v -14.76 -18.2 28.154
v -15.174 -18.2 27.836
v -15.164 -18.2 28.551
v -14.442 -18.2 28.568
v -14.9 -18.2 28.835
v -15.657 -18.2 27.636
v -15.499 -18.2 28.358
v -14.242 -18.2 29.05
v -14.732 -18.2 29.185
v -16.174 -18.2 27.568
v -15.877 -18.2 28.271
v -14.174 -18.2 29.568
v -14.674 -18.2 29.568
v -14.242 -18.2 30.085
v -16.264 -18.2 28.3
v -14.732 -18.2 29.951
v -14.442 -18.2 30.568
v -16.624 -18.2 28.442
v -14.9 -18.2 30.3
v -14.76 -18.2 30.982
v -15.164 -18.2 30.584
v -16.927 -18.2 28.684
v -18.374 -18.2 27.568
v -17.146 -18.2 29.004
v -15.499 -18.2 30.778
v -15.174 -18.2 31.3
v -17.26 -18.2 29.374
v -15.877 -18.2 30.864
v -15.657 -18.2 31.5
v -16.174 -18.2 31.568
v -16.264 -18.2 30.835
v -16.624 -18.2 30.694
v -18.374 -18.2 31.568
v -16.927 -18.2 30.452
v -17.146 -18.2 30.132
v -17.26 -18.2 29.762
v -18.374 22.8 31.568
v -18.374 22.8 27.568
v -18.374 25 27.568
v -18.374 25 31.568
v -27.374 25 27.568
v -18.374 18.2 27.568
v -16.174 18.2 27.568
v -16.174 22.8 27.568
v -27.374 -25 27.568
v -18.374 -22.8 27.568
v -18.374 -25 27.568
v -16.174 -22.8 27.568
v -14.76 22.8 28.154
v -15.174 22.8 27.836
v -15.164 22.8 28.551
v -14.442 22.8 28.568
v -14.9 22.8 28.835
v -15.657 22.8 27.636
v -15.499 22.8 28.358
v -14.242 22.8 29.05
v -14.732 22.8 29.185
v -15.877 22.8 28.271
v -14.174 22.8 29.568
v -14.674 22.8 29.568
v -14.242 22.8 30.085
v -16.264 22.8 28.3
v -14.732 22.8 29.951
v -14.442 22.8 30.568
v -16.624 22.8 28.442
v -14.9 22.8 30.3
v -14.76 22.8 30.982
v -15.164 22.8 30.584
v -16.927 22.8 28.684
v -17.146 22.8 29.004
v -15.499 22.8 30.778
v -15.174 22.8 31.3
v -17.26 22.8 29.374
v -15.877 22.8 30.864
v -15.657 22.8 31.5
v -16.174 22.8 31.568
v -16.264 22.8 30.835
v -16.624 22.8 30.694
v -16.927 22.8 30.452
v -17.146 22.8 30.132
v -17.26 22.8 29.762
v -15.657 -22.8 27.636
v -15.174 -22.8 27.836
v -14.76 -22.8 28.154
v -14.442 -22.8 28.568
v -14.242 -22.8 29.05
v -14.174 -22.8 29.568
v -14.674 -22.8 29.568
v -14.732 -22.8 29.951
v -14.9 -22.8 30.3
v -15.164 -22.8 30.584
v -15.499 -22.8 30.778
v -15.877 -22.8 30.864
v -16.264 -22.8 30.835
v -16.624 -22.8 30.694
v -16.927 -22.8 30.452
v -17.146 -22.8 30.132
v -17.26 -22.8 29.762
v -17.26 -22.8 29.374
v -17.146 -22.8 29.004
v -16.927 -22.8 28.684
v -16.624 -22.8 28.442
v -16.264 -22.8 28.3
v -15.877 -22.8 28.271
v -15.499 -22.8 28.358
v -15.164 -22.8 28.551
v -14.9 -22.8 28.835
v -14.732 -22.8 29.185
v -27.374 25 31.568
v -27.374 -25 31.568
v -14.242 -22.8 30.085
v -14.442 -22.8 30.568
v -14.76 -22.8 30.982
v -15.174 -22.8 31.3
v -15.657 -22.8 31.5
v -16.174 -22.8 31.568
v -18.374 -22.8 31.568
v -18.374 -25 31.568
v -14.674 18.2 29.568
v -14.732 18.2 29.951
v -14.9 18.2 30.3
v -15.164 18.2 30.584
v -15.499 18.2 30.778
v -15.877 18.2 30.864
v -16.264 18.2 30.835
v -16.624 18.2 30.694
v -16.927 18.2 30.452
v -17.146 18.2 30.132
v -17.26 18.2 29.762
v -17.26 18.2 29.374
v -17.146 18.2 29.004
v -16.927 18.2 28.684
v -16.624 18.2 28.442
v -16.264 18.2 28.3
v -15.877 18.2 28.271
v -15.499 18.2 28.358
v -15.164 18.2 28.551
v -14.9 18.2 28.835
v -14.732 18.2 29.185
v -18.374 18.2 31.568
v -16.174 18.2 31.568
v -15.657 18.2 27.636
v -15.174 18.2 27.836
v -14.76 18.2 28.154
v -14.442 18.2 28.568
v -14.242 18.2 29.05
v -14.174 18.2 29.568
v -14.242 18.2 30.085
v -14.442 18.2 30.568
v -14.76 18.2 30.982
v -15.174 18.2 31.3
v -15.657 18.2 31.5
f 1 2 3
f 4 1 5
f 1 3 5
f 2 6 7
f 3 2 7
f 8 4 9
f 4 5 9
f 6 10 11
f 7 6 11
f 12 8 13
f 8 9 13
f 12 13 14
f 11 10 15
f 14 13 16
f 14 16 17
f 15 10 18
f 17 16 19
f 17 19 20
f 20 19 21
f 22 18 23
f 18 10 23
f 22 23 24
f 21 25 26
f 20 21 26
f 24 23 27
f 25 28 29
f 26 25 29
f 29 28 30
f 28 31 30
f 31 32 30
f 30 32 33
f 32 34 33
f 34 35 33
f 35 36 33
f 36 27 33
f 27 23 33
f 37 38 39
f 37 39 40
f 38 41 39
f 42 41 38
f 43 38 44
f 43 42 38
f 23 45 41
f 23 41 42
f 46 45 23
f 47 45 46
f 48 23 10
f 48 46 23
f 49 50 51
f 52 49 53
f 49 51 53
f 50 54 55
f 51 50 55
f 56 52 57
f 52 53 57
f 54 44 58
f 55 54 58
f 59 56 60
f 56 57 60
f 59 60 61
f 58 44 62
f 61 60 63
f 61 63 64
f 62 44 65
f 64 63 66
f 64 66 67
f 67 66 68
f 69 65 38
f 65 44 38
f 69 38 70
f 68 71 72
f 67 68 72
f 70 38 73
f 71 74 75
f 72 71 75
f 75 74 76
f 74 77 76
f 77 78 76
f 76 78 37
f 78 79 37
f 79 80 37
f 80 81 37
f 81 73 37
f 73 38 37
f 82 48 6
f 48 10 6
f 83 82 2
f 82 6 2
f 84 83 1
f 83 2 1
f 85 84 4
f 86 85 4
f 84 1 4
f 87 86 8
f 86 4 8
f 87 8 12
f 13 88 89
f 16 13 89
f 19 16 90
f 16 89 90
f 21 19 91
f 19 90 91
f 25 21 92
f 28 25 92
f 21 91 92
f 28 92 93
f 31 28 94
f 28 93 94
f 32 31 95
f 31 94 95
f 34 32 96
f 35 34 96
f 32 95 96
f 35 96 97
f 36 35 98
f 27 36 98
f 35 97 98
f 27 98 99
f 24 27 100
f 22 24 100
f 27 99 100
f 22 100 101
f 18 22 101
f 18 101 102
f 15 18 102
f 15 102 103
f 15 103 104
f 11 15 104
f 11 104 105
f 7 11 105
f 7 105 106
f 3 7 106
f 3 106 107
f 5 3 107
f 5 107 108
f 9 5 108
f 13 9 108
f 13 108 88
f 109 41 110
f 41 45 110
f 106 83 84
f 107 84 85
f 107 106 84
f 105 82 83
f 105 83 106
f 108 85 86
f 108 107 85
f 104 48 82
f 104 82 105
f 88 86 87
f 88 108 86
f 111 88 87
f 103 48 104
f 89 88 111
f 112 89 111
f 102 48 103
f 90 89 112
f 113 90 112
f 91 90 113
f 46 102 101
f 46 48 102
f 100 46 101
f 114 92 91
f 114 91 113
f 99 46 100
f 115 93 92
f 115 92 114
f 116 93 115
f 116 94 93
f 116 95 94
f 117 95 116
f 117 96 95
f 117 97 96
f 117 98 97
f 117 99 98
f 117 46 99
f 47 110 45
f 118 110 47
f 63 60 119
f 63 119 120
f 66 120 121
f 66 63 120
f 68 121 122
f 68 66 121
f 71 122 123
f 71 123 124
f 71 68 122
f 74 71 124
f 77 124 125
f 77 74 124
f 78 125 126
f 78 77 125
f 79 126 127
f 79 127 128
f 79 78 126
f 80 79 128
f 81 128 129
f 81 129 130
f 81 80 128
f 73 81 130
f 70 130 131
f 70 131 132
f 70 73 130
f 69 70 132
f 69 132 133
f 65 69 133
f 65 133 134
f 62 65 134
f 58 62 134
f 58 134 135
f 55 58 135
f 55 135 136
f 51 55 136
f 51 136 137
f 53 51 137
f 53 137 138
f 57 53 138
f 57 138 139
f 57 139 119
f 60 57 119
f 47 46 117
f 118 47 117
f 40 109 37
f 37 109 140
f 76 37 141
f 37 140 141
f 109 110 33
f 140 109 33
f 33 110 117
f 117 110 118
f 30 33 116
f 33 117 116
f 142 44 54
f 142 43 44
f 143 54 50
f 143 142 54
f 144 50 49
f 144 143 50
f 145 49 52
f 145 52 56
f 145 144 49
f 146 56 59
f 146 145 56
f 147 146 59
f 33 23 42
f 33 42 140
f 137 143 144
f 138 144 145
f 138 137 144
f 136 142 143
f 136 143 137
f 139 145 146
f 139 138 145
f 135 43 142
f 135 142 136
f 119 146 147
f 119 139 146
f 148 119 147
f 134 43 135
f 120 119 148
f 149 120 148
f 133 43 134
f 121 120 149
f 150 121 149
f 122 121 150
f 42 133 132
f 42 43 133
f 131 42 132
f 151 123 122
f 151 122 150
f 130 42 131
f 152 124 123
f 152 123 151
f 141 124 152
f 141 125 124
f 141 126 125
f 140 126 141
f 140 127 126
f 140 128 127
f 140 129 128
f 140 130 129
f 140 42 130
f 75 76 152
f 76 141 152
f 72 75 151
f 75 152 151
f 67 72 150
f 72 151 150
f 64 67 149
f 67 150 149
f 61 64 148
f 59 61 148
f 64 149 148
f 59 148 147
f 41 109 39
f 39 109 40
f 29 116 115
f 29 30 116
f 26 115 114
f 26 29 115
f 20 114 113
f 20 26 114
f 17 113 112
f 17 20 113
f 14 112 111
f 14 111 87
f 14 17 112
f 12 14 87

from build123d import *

# Parameters (mm, degrees)
F0_W     = 9
F0_H     = 4
F1_DEPTH = 25
F2_W     = 4.6
F2_H     = 4
F3_DEPTH = 4.2
F4_R     = 1.3
F5_DEPTH = 25
F6_R     = 1.99999


# Not quite as in the source:
# - a fillet or chamfer is up to 0.001 mm smaller than in the source, because OpenCascade refuses the exact size


with BuildPart() as f1:
    # F0 (on Front) → F1 (new body)
    with BuildSketch(Plane.XZ):
        with Locations((-22.8743378759, 29.5677930117)):
            Rectangle(F0_W, F0_H)
    extrude(amount=F1_DEPTH)

    # F2 (on face) → F3 (join)
    with BuildSketch(Plane.YZ.offset(-18.3743378759)):
        with Locations((-20.5, 29.5677930117)):
            Rectangle(F2_W, F2_H)
    extrude(amount=F3_DEPTH)

    # F4 (on face) → F5 (cut)
    with BuildSketch(Plane.XZ.offset(22.8)):
        with Locations((-15.9743378759, 29.5677930117)):
            Circle(F4_R)
    extrude(amount=-F5_DEPTH, mode=Mode.SUBTRACT)

    # F6 (radius 2 in the source; OpenCascade refuses exactly that, so slightly less here)
    f6_edges = [f1.edges().sort_by_distance(p)[0] for p in [
        (-14.174338, -20.5, 31.567793),
        (-14.174338, -20.5, 27.567793),
    ]]
    fillet(f6_edges, radius=F6_R)

    # F7: F1 across face


with BuildPart() as f1_1:
    add(f1.part)
    add(f1.part.mirror(Plane(origin=(-22.8743378759, 0, 29.5677930117), x_dir=(1, 0, 0), z_dir=(0, 1, 0))))


with BuildPart() as f8_1:
    # F8: copy of F1
    add(f1_1.part)


solid = f1_1.part
